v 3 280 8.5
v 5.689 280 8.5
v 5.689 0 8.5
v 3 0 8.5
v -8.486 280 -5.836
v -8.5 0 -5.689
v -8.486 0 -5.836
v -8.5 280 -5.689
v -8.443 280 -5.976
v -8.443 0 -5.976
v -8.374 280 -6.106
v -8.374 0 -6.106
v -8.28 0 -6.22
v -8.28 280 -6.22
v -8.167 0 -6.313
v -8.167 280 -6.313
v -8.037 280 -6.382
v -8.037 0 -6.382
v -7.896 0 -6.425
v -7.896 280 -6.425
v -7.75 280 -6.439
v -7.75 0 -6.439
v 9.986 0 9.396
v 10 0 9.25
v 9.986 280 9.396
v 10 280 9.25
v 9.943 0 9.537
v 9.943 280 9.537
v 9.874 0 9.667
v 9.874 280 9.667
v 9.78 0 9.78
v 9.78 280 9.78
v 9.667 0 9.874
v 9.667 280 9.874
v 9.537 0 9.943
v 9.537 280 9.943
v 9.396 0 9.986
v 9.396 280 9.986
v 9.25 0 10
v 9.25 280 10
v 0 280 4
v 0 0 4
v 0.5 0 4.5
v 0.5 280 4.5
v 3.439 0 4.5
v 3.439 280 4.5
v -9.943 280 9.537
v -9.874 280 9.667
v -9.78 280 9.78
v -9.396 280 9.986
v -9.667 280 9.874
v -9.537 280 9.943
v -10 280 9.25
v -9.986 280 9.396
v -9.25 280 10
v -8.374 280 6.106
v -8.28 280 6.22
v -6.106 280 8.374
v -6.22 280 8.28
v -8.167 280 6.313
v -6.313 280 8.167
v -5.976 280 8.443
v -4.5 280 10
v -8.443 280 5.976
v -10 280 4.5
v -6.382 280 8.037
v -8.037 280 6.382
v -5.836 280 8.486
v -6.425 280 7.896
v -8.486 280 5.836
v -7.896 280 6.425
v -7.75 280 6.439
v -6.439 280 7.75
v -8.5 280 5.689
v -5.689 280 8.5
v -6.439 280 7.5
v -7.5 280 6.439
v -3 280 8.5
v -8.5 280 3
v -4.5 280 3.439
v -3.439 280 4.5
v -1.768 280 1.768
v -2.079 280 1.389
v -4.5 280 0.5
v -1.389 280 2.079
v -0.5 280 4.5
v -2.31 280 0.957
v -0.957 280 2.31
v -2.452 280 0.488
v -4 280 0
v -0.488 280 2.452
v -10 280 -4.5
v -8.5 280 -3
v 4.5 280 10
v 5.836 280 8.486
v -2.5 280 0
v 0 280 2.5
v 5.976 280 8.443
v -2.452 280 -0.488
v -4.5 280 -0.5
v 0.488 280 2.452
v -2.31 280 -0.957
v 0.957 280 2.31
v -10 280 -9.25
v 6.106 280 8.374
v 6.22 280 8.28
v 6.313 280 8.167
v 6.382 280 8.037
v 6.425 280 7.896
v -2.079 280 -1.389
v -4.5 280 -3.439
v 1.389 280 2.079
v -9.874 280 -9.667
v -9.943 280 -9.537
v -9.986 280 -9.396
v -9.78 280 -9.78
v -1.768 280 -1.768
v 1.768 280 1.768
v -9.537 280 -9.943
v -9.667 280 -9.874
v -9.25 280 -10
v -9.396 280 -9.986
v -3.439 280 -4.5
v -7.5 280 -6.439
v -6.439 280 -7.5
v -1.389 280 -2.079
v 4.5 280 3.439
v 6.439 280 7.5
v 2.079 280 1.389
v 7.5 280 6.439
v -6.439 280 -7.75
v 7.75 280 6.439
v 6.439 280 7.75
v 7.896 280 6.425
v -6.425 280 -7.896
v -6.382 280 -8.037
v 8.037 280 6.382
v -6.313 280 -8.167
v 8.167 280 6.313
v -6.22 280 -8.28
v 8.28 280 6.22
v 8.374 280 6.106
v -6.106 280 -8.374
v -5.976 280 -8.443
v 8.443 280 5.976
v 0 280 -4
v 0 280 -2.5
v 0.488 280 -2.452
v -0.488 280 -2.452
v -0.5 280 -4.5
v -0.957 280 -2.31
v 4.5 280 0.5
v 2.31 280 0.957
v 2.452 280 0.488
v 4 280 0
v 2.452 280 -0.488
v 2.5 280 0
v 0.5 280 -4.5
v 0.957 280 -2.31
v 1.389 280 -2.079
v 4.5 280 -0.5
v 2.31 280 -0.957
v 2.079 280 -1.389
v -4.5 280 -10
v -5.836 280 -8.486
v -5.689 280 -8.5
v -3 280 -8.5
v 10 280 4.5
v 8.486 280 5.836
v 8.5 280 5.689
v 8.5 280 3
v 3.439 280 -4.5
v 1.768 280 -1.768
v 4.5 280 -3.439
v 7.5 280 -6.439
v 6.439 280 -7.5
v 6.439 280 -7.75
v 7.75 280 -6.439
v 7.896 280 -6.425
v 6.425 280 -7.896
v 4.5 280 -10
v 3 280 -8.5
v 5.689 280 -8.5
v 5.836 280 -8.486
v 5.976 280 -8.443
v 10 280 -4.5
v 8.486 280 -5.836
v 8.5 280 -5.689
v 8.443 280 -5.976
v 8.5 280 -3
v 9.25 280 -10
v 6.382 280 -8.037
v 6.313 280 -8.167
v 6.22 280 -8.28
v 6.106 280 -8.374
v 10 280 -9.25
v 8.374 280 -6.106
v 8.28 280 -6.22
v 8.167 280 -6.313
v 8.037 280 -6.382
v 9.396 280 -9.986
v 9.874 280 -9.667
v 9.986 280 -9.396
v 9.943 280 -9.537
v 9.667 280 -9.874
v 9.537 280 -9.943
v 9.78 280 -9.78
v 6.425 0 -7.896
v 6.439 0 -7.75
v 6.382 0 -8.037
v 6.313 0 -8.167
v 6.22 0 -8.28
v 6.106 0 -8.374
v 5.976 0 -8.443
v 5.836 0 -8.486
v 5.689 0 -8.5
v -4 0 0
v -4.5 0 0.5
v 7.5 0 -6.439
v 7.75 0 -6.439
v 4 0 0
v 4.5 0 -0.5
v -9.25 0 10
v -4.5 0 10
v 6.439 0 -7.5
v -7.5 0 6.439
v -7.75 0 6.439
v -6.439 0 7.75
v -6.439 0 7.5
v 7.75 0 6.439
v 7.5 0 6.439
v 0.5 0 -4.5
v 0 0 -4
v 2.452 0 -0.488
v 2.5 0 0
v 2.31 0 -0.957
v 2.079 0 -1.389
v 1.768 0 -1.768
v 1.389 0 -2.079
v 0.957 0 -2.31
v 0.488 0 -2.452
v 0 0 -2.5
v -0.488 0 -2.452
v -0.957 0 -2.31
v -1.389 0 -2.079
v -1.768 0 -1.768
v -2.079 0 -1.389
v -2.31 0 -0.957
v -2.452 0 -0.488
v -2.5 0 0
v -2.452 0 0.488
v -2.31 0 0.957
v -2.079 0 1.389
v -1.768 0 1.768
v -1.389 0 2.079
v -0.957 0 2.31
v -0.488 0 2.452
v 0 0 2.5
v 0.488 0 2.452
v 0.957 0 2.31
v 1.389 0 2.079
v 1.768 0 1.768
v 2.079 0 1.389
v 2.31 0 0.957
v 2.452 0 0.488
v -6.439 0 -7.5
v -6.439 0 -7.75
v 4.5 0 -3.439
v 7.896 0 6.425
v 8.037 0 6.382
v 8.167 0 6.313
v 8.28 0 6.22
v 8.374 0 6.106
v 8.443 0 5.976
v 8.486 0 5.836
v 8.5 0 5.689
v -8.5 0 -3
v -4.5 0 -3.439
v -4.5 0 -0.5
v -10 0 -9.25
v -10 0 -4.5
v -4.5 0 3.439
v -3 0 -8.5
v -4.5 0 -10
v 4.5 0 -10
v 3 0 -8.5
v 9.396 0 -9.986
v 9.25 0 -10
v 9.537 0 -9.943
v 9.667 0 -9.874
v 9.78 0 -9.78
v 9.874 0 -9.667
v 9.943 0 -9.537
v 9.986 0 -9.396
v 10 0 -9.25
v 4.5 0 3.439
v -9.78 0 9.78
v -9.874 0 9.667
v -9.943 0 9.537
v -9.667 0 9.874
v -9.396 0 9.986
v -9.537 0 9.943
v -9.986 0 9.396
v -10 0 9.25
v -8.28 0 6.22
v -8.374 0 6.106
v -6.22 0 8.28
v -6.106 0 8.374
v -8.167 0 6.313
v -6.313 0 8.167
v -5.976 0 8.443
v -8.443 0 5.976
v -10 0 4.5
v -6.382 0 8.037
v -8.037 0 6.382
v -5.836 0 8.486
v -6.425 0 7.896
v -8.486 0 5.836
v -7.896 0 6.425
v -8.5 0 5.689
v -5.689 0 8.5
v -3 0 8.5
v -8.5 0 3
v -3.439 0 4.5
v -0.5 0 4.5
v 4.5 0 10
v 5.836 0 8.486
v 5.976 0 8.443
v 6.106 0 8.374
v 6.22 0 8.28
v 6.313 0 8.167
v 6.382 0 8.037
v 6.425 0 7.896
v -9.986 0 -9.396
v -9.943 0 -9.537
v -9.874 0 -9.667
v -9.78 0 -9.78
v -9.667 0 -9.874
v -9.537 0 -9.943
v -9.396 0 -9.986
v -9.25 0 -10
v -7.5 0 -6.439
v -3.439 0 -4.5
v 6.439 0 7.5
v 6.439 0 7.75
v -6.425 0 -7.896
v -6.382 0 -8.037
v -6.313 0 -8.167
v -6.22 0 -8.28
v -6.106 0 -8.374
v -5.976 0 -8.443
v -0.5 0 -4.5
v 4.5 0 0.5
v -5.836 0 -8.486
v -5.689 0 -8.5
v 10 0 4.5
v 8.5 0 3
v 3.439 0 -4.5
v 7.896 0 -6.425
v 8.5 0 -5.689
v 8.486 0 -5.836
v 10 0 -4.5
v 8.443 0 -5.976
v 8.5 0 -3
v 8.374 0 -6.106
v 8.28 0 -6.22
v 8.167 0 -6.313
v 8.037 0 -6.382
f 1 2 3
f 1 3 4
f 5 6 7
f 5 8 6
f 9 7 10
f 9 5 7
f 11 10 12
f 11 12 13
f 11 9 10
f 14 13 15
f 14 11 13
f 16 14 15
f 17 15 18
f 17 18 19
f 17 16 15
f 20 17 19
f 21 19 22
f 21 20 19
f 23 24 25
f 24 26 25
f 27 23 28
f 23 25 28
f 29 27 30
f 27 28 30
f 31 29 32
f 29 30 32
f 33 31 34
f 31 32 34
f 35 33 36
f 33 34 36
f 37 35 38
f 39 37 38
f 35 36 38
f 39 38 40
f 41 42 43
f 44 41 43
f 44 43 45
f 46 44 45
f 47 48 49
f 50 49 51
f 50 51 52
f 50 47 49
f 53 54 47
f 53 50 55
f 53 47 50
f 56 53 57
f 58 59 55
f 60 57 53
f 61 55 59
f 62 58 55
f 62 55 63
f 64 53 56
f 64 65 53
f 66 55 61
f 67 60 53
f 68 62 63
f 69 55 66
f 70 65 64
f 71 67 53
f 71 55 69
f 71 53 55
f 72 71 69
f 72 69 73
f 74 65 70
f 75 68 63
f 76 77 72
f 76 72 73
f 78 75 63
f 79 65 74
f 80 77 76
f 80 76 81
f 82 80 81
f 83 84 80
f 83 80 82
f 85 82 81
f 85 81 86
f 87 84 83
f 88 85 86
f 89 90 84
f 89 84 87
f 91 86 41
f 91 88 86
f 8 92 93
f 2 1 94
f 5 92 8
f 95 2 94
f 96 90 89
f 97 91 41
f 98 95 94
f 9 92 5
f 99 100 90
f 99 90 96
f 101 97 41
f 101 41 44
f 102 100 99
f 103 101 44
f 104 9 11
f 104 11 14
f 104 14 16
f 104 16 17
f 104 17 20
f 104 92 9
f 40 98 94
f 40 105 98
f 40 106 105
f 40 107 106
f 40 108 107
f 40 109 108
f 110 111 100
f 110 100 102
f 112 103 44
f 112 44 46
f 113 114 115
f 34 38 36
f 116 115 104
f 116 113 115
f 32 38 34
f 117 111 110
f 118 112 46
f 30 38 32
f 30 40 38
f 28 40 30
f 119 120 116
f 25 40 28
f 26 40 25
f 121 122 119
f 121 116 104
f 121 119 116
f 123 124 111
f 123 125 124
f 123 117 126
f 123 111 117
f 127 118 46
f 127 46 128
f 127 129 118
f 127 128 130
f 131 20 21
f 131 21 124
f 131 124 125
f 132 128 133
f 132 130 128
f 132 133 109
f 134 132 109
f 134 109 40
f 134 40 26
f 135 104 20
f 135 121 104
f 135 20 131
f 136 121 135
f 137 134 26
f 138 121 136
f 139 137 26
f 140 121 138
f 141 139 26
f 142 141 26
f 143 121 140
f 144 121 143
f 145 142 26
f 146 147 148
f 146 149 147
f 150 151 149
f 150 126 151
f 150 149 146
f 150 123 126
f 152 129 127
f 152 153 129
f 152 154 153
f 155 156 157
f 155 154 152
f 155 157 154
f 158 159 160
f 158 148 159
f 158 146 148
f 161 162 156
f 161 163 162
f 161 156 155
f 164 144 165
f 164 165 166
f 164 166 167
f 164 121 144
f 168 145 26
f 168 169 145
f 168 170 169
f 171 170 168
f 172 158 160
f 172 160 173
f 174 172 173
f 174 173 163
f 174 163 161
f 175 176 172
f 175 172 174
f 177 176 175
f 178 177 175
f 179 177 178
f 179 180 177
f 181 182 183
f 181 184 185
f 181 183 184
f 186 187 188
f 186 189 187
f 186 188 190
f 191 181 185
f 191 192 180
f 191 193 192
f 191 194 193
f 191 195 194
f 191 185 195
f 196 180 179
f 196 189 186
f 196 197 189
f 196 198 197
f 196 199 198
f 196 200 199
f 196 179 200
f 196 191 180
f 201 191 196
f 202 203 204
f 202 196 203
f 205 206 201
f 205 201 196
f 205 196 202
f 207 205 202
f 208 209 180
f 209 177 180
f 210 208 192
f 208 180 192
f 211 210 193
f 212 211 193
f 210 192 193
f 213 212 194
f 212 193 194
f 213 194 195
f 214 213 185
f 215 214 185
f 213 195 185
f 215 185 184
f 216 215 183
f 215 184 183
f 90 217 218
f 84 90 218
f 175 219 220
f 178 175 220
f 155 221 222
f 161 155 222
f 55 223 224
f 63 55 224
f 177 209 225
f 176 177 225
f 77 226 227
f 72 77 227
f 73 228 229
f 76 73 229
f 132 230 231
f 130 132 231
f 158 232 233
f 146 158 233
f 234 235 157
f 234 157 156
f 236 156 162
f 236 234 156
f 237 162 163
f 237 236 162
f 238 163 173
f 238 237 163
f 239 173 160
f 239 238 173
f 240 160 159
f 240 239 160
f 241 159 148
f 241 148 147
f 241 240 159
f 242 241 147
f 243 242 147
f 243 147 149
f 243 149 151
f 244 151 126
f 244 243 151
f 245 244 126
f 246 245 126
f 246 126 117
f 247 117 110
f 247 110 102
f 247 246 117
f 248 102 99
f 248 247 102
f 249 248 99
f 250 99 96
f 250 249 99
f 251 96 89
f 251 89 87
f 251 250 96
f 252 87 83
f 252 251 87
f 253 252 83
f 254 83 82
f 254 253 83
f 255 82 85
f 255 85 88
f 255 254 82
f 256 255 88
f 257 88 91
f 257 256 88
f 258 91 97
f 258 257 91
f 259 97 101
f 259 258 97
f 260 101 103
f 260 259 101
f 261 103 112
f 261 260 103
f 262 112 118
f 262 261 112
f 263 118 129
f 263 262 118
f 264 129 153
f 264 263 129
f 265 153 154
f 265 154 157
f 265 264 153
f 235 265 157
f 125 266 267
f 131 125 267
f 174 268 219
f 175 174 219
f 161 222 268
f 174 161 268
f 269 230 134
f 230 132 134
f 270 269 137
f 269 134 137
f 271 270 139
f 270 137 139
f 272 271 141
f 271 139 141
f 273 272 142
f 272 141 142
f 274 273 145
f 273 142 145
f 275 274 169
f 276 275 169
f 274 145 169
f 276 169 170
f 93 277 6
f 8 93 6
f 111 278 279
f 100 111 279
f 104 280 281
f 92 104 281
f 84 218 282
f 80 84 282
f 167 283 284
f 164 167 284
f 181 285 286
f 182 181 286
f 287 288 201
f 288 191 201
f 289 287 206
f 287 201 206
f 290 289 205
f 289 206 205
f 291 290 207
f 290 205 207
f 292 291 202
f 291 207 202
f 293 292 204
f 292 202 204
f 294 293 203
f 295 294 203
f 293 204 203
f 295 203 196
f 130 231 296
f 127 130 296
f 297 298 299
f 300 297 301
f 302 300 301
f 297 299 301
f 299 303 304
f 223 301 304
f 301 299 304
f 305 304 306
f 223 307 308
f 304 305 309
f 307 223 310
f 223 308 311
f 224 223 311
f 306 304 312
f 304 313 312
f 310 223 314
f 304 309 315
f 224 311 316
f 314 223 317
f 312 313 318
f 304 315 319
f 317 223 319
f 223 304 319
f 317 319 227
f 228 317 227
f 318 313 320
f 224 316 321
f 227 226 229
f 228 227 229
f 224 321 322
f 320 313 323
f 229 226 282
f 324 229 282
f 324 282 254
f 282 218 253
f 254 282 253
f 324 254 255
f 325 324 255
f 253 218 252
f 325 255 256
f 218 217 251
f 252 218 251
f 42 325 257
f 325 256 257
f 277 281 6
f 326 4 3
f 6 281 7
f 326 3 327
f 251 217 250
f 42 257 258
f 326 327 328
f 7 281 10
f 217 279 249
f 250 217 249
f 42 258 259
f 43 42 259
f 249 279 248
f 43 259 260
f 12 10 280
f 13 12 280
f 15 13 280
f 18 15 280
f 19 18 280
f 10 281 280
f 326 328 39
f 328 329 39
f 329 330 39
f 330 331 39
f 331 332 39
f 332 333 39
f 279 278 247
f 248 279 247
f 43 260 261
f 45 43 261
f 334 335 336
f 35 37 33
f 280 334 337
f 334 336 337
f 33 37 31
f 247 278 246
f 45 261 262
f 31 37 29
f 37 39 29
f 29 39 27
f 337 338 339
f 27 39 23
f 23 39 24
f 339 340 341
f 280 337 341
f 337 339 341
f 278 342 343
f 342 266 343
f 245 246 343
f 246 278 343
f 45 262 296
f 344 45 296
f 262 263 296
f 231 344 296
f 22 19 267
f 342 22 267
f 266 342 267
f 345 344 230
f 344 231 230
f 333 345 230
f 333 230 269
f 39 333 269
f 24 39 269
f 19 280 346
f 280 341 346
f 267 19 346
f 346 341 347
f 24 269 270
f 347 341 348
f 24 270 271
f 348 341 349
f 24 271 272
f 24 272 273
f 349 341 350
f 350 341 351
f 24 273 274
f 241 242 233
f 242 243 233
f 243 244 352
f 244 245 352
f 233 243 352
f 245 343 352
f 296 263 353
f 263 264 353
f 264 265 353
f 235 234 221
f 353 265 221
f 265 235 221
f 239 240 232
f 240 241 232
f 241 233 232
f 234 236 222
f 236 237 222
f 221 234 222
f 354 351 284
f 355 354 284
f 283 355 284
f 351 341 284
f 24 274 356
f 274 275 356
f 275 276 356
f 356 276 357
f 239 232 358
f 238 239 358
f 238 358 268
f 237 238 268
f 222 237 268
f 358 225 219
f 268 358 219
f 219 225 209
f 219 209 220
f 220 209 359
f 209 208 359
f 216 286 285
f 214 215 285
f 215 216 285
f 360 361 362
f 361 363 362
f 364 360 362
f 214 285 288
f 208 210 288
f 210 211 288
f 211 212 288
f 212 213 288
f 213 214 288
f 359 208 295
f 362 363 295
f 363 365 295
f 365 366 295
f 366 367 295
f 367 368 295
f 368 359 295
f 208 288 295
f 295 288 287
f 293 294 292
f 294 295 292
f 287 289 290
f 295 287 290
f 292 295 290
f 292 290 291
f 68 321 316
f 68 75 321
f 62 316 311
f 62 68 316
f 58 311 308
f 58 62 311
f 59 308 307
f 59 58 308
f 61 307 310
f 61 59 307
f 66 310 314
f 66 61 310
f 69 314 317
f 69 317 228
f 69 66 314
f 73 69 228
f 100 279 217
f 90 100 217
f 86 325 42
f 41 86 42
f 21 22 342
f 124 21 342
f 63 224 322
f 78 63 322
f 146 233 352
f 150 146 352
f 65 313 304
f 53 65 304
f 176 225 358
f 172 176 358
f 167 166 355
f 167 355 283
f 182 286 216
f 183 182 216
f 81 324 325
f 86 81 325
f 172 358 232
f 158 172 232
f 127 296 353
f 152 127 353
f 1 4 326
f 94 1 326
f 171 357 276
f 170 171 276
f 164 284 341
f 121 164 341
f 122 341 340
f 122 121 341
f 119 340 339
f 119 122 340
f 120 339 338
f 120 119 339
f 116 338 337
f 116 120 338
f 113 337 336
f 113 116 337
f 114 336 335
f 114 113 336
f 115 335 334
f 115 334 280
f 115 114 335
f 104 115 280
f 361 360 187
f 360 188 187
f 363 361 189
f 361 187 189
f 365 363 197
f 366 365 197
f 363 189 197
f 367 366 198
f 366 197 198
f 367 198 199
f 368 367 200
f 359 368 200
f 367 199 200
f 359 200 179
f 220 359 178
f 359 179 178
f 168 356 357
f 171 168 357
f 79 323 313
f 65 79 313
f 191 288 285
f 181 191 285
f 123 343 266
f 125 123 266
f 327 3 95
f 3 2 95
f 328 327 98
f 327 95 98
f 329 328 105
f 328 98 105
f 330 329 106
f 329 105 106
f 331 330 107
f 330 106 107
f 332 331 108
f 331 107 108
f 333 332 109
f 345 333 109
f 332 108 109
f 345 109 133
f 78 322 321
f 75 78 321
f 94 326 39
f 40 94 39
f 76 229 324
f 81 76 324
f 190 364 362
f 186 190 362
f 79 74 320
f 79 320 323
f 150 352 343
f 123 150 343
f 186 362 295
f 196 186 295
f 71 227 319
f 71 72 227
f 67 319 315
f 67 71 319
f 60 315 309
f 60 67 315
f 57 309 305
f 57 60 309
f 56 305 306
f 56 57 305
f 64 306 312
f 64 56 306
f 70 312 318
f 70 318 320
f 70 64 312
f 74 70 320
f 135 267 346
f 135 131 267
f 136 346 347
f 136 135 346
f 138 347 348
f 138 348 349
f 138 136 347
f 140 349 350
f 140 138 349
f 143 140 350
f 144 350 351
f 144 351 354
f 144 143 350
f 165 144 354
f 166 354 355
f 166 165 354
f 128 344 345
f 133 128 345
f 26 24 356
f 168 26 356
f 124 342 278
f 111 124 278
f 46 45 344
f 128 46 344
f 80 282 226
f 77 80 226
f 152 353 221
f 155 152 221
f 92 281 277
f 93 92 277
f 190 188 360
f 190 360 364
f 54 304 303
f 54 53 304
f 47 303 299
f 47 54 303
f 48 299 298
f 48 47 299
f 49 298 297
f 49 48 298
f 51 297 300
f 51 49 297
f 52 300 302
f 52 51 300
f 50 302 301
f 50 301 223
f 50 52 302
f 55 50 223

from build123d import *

# Parameters (mm, degrees)
ESQUISSE1_R      = 2.5
EXTRUSION1_DEPTH = 280
CONG_1_R         = 0.75


with BuildPart() as part:
    # Esquisse1 → Extrusion1 (new body)
    with BuildSketch(Plane(origin=(0, 0, 0), x_dir=(1, 0, 0), z_dir=(0, 1, 0))):
        Polygon((0, 4), (-0.5, 4.5), (-3.439339828, 4.5), (-6.439339828, 7.5), (-6.439339828, 8.5), (-3, 8.5), (-4.5, 10), (-10, 10), (-10, 4.5), (-8.5, 3), (-8.5, 6.439339828), (-7.5, 6.439339828), (-4.5, 3.439339828), (-4.5, 0.5), (-4, 0), (-4.5, -0.5), (-4.5, -3.439339828), (-7.5, -6.439339828), (-8.5, -6.439339828), (-8.5, -3), (-10, -4.5), (-10, -10), (-4.5, -10), (-3, -8.5), (-6.439339828, -8.5), (-6.439339828, -7.5), (-3.439339828, -4.5), (-0.5, -4.5), (0, -4), (0.5, -4.5), (3.439339828, -4.5), (6.439339828, -7.5), (6.439339828, -8.5), (3, -8.5), (4.5, -10), (10, -10), (10, -4.5), (8.5, -3), (8.5, -6.439339828), (7.5, -6.439339828), (4.5, -3.439339828), (4.5, -0.5), (4, 0), (4.5, 0.5), (4.5, 3.439339828), (7.5, 6.439339828), (8.5, 6.439339828), (8.5, 3), (10, 4.5), (10, 10), (4.5, 10), (3, 8.5), (6.439339828, 8.5), (6.439339828, 7.5), (3.439339828, 4.5), (0.5, 4.5), align=None)
        Circle(ESQUISSE1_R, mode=Mode.SUBTRACT)
    extrude(amount=EXTRUSION1_DEPTH)

    # Congé1
    cong_1_edges = [part.edges().sort_by_distance(p)[0] for p in [
        (6.439339828, 140, -8.5),
        (10, 140, -10),
        (8.5, 140, -6.439339828),
        (8.5, 140, 6.439339828),
        (10, 140, 10),
        (6.439339828, 140, 8.5),
        (-6.439339828, 140, 8.5),
        (-10, 140, 10),
        (-8.5, 140, 6.439339828),
        (-8.5, 140, -6.439339828),
        (-10, 140, -10),
        (-6.439339828, 140, -8.5),
    ]]
    fillet(cong_1_edges, radius=CONG_1_R)


solid = part.part
